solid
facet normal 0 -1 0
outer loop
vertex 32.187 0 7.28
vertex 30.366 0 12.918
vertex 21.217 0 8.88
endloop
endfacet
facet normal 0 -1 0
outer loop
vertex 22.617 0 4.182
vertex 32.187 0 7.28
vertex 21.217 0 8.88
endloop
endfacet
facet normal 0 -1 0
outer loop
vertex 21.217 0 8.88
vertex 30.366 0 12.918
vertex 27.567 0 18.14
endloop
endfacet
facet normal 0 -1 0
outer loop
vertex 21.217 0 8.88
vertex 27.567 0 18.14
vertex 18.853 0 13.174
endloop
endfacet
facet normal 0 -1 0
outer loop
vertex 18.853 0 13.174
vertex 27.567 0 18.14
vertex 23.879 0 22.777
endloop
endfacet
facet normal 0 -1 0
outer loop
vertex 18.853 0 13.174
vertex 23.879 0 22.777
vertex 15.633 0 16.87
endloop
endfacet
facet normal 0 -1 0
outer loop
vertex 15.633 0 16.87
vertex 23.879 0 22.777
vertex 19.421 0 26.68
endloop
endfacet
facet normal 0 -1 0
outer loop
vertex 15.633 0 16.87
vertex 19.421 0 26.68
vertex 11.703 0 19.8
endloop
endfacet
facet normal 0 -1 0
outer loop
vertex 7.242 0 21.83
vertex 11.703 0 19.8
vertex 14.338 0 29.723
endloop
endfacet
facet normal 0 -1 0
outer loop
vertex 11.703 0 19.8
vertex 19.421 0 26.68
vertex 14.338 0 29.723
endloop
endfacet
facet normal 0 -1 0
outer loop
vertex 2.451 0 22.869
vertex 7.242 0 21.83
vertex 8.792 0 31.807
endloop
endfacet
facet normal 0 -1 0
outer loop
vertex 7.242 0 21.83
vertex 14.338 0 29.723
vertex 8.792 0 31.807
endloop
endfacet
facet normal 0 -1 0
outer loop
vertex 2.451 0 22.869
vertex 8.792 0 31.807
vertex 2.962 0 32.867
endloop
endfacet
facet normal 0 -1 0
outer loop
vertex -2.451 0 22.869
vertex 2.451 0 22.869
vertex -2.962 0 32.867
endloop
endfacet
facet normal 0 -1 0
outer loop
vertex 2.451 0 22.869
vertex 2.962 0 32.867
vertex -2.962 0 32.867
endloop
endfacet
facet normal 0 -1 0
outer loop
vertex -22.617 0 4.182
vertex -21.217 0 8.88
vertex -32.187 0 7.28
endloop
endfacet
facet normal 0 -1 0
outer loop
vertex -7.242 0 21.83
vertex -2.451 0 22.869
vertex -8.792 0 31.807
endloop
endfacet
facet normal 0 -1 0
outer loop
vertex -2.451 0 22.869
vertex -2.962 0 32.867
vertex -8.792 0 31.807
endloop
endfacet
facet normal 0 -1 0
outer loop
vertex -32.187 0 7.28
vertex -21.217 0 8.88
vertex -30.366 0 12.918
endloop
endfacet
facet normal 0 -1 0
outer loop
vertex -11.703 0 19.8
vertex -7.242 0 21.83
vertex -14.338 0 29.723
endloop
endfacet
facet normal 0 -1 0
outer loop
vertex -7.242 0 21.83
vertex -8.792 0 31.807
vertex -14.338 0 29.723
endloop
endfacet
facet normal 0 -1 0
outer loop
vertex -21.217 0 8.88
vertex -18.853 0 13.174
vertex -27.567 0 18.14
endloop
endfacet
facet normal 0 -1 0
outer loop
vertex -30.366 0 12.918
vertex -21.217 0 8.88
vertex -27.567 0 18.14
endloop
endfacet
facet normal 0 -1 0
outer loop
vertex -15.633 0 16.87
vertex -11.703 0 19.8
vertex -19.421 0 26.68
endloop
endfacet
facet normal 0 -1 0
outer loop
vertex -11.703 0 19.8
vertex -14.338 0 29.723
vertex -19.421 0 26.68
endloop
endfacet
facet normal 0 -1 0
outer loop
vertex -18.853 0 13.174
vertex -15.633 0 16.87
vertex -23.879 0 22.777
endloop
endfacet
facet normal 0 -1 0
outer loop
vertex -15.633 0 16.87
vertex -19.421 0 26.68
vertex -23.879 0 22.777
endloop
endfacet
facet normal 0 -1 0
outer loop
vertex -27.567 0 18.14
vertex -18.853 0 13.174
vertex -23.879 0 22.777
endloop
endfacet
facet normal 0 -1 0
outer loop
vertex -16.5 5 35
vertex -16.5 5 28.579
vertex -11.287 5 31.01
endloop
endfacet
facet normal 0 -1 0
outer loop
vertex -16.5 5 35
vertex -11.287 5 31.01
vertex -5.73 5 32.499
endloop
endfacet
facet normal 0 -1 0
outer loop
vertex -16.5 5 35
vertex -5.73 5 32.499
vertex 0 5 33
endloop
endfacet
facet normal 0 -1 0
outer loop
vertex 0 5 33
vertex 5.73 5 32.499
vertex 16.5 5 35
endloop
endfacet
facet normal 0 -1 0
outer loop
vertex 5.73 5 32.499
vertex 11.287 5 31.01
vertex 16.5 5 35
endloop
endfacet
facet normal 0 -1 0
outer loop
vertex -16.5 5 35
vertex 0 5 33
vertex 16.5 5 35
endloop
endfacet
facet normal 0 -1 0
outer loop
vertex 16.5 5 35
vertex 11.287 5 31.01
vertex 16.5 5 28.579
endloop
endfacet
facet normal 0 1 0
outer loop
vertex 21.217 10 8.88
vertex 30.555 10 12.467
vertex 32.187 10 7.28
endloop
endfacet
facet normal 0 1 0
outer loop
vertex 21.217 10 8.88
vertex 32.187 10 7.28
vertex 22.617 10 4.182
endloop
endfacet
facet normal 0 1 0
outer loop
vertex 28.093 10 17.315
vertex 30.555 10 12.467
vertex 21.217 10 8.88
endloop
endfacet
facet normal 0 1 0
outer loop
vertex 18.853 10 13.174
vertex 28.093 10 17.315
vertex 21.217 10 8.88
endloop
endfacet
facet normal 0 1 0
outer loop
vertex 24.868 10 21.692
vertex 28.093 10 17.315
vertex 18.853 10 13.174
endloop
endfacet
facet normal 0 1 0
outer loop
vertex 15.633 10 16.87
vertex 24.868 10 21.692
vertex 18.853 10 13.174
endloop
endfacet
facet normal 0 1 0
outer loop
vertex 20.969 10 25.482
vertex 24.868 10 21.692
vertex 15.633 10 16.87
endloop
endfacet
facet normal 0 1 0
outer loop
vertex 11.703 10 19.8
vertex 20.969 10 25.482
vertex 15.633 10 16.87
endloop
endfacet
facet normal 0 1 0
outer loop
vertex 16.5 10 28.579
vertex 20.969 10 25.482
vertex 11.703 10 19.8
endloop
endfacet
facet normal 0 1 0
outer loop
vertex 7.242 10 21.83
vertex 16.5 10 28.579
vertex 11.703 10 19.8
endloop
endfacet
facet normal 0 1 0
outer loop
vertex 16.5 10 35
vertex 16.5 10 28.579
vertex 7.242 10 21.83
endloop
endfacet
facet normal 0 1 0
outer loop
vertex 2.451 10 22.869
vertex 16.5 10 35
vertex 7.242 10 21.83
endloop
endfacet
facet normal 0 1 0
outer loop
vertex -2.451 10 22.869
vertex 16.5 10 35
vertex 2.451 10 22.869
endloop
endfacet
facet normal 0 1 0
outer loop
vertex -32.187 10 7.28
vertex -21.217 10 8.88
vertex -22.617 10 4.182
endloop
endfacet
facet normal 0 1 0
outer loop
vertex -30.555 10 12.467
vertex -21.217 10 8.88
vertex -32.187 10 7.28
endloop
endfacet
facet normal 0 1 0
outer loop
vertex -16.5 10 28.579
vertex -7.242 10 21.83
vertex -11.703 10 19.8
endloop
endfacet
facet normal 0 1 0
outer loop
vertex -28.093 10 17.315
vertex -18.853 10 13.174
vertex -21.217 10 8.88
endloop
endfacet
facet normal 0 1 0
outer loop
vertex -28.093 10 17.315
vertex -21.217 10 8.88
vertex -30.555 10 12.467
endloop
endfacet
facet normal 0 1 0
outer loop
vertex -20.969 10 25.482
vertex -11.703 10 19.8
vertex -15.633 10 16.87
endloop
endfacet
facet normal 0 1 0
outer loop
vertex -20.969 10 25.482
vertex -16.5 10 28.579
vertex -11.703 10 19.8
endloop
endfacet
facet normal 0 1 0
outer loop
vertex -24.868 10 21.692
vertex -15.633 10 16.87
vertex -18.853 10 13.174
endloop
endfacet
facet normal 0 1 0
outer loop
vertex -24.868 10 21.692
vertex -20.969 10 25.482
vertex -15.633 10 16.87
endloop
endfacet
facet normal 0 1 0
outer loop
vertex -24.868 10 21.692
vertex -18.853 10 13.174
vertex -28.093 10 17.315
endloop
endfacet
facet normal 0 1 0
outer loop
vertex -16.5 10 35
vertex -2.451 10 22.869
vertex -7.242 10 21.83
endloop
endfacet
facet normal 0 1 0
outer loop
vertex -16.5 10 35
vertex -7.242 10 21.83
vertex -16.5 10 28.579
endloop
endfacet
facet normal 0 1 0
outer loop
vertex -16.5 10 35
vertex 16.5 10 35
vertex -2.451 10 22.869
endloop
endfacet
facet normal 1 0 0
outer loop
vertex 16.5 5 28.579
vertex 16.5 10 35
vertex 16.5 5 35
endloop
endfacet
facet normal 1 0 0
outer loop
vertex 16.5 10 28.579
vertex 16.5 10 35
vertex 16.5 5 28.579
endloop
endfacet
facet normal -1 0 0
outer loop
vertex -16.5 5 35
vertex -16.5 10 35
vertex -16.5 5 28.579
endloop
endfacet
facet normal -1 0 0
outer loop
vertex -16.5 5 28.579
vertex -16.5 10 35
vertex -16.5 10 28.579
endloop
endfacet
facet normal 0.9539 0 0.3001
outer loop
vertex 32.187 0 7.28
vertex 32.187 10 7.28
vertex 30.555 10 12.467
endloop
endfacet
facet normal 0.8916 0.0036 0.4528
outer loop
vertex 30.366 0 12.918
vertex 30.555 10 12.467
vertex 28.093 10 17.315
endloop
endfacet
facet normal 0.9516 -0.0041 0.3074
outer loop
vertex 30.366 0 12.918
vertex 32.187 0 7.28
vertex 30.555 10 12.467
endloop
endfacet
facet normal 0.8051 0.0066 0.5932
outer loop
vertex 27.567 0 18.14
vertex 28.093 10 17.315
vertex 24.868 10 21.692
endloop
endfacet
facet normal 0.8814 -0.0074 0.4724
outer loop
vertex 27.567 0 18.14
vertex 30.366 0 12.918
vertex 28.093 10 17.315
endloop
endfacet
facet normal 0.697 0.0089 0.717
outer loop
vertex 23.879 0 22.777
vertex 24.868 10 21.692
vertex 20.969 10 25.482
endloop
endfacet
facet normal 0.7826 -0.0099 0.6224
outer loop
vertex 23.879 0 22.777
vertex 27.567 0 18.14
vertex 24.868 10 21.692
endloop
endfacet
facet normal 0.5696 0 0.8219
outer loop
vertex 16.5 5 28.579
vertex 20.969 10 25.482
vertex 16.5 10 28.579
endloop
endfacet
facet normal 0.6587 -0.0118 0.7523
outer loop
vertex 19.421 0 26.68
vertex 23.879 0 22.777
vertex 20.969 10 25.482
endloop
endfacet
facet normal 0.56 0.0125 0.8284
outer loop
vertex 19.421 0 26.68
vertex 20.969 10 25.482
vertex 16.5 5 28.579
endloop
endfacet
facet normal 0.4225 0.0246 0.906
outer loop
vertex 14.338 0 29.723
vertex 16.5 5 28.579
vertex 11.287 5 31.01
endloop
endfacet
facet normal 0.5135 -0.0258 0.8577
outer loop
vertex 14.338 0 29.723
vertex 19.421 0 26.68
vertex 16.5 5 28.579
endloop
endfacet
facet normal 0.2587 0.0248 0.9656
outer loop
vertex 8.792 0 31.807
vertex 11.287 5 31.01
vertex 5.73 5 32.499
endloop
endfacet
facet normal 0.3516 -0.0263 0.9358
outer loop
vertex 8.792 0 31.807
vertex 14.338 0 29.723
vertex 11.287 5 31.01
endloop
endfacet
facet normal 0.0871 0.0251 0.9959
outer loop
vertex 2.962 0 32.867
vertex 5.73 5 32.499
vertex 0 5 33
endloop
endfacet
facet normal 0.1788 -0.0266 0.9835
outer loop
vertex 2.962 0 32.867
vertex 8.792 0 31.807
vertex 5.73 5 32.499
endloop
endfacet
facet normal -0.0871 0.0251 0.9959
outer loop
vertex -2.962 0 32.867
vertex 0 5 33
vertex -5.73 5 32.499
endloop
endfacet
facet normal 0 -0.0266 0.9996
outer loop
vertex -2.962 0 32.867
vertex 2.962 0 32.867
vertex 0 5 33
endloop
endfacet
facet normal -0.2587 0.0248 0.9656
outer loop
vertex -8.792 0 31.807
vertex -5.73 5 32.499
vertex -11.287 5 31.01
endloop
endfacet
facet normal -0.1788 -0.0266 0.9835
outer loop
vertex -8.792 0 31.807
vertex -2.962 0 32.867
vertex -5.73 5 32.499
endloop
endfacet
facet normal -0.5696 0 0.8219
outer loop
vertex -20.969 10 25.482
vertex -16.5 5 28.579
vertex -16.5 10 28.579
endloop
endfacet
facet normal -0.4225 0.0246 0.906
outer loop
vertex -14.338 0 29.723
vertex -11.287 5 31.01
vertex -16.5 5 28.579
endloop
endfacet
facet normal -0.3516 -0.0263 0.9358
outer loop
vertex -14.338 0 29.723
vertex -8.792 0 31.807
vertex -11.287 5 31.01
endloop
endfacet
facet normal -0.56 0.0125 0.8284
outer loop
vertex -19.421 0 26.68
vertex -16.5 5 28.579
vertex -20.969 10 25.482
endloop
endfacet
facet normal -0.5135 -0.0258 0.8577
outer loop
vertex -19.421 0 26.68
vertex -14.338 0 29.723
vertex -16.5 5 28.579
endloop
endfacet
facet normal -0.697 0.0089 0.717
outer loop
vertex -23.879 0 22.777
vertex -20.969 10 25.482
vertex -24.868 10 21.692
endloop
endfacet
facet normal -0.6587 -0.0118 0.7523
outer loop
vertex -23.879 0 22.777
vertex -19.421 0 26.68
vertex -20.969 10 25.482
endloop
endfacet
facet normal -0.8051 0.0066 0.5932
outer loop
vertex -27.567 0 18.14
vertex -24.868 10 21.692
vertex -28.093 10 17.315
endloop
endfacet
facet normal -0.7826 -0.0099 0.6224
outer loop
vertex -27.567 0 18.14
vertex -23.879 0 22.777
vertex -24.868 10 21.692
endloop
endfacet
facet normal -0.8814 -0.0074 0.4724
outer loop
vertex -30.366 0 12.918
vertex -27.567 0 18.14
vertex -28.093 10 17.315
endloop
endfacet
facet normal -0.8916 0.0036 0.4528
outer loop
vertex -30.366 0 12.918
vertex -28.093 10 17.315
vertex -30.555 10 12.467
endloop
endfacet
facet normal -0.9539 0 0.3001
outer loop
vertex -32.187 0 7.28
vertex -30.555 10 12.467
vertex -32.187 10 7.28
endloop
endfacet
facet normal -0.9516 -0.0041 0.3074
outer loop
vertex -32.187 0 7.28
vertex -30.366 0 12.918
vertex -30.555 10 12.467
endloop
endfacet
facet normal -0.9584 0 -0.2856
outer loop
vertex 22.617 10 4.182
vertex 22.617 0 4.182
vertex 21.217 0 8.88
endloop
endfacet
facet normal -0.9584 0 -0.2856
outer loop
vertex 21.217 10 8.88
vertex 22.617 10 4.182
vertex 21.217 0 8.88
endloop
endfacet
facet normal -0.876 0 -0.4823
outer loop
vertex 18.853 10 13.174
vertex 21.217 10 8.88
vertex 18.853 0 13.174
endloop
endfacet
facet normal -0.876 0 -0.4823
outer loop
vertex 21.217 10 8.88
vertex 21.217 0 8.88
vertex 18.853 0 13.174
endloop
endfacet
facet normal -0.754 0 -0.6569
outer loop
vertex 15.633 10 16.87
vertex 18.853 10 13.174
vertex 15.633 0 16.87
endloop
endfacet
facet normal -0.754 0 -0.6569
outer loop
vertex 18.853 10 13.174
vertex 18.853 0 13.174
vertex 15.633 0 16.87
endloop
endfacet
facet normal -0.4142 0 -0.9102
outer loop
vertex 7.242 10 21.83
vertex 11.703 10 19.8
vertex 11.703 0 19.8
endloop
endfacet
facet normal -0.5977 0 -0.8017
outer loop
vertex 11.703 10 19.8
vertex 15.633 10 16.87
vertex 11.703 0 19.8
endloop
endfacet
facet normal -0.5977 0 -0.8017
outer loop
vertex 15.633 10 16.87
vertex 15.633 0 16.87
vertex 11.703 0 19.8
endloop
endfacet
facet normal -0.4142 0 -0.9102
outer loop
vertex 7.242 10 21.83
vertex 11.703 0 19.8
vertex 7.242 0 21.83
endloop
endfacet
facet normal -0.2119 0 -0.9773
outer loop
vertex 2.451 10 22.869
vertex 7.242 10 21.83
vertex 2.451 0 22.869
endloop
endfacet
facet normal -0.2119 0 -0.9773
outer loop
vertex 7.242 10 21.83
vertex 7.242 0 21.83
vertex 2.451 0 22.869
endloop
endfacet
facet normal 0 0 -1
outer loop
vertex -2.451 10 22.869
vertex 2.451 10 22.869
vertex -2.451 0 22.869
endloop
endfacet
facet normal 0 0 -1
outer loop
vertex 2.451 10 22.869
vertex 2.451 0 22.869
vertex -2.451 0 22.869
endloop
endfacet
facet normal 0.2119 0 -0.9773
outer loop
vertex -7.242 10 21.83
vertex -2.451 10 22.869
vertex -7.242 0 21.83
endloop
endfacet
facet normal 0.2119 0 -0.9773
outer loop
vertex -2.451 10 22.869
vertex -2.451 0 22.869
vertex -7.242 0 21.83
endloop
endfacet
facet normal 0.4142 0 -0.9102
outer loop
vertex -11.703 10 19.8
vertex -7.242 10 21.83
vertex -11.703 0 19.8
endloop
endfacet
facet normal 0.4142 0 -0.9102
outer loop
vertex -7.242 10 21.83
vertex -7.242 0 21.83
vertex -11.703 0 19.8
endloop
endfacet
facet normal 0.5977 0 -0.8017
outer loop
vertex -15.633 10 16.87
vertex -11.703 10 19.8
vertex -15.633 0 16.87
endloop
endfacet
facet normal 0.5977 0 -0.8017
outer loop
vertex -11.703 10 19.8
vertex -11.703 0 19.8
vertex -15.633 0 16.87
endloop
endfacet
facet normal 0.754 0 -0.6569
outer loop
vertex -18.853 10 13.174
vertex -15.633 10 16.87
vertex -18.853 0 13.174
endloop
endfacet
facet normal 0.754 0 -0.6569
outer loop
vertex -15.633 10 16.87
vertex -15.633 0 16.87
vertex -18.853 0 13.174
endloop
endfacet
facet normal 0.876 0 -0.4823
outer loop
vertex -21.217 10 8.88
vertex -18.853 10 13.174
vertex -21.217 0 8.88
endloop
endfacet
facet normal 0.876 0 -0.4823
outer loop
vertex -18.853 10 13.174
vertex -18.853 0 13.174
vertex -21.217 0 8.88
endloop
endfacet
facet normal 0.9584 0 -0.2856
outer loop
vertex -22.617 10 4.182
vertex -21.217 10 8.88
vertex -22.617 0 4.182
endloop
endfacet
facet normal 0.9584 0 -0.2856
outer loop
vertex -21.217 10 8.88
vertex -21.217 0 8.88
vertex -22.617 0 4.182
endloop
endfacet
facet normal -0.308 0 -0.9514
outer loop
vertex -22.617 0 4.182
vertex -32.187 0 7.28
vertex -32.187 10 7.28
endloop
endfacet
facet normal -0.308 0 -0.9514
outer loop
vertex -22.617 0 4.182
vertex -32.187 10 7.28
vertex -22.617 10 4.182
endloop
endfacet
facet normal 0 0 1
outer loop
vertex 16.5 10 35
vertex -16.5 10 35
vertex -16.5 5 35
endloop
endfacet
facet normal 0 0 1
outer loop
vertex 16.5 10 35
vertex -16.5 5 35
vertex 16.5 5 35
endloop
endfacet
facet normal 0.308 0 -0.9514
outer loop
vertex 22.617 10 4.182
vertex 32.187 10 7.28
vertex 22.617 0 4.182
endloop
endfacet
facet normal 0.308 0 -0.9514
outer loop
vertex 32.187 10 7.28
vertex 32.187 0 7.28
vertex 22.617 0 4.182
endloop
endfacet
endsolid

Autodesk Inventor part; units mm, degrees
ref_plane "YZ Plane" through (0, 0, 0) normal (1, 0, 0) x (0, 1, 0)
ref_plane "XZ Plane" through (0, 0, 0) normal (0, 1, 0) x (-1, 0, 0)
ref_plane "XY Plane" through (0, 0, 0) normal (0, 0, 1) x (1, 0, 0)
sketch "Sketch1" plane through (0, 0, 0) normal (0, 1, 0) x (-1, 0, 0)
  line L0 (32.1869, 7.2802) -> (22.6166, 4.1818)
  line L1 (-32.1869, 7.2802) -> (-22.6166, 4.1818)
  arc A0 (32.1869, 7.2802) -> (-32.1869, 7.2802) centre (0, 0) ccw
  arc A1 (22.6166, 4.1818) -> (-22.6166, 4.1818) centre (0, 0) ccw
  dimension "d7" = 23
  dimension "d8" = 33
extrude "Extrusion1" add sketch "Sketch1" along normal blind 10
sketch "Sketch2" plane through (0, 10, 0) normal (0, 1, 0) x (1, 0, 0)
  arc A0 (-32.1869, -7.2802) -> (32.1869, -7.2802) centre (0, 0) ccw projected
  line L0 (0, -35) -> (-16.5, -35)
  line L1 (-16.5, -35) -> (16.5, -35)
  line L2 (-16.5, -35) -> (-16.5, -28.5788)
  line L3 (16.5, -35) -> (16.5, -28.5788)
  dimension "d10" = 16.5
  dimension "d11" = 33
extrude "Extrusion2" add sketch "Sketch2" against normal blind 5
properties part number "g_jaws"
